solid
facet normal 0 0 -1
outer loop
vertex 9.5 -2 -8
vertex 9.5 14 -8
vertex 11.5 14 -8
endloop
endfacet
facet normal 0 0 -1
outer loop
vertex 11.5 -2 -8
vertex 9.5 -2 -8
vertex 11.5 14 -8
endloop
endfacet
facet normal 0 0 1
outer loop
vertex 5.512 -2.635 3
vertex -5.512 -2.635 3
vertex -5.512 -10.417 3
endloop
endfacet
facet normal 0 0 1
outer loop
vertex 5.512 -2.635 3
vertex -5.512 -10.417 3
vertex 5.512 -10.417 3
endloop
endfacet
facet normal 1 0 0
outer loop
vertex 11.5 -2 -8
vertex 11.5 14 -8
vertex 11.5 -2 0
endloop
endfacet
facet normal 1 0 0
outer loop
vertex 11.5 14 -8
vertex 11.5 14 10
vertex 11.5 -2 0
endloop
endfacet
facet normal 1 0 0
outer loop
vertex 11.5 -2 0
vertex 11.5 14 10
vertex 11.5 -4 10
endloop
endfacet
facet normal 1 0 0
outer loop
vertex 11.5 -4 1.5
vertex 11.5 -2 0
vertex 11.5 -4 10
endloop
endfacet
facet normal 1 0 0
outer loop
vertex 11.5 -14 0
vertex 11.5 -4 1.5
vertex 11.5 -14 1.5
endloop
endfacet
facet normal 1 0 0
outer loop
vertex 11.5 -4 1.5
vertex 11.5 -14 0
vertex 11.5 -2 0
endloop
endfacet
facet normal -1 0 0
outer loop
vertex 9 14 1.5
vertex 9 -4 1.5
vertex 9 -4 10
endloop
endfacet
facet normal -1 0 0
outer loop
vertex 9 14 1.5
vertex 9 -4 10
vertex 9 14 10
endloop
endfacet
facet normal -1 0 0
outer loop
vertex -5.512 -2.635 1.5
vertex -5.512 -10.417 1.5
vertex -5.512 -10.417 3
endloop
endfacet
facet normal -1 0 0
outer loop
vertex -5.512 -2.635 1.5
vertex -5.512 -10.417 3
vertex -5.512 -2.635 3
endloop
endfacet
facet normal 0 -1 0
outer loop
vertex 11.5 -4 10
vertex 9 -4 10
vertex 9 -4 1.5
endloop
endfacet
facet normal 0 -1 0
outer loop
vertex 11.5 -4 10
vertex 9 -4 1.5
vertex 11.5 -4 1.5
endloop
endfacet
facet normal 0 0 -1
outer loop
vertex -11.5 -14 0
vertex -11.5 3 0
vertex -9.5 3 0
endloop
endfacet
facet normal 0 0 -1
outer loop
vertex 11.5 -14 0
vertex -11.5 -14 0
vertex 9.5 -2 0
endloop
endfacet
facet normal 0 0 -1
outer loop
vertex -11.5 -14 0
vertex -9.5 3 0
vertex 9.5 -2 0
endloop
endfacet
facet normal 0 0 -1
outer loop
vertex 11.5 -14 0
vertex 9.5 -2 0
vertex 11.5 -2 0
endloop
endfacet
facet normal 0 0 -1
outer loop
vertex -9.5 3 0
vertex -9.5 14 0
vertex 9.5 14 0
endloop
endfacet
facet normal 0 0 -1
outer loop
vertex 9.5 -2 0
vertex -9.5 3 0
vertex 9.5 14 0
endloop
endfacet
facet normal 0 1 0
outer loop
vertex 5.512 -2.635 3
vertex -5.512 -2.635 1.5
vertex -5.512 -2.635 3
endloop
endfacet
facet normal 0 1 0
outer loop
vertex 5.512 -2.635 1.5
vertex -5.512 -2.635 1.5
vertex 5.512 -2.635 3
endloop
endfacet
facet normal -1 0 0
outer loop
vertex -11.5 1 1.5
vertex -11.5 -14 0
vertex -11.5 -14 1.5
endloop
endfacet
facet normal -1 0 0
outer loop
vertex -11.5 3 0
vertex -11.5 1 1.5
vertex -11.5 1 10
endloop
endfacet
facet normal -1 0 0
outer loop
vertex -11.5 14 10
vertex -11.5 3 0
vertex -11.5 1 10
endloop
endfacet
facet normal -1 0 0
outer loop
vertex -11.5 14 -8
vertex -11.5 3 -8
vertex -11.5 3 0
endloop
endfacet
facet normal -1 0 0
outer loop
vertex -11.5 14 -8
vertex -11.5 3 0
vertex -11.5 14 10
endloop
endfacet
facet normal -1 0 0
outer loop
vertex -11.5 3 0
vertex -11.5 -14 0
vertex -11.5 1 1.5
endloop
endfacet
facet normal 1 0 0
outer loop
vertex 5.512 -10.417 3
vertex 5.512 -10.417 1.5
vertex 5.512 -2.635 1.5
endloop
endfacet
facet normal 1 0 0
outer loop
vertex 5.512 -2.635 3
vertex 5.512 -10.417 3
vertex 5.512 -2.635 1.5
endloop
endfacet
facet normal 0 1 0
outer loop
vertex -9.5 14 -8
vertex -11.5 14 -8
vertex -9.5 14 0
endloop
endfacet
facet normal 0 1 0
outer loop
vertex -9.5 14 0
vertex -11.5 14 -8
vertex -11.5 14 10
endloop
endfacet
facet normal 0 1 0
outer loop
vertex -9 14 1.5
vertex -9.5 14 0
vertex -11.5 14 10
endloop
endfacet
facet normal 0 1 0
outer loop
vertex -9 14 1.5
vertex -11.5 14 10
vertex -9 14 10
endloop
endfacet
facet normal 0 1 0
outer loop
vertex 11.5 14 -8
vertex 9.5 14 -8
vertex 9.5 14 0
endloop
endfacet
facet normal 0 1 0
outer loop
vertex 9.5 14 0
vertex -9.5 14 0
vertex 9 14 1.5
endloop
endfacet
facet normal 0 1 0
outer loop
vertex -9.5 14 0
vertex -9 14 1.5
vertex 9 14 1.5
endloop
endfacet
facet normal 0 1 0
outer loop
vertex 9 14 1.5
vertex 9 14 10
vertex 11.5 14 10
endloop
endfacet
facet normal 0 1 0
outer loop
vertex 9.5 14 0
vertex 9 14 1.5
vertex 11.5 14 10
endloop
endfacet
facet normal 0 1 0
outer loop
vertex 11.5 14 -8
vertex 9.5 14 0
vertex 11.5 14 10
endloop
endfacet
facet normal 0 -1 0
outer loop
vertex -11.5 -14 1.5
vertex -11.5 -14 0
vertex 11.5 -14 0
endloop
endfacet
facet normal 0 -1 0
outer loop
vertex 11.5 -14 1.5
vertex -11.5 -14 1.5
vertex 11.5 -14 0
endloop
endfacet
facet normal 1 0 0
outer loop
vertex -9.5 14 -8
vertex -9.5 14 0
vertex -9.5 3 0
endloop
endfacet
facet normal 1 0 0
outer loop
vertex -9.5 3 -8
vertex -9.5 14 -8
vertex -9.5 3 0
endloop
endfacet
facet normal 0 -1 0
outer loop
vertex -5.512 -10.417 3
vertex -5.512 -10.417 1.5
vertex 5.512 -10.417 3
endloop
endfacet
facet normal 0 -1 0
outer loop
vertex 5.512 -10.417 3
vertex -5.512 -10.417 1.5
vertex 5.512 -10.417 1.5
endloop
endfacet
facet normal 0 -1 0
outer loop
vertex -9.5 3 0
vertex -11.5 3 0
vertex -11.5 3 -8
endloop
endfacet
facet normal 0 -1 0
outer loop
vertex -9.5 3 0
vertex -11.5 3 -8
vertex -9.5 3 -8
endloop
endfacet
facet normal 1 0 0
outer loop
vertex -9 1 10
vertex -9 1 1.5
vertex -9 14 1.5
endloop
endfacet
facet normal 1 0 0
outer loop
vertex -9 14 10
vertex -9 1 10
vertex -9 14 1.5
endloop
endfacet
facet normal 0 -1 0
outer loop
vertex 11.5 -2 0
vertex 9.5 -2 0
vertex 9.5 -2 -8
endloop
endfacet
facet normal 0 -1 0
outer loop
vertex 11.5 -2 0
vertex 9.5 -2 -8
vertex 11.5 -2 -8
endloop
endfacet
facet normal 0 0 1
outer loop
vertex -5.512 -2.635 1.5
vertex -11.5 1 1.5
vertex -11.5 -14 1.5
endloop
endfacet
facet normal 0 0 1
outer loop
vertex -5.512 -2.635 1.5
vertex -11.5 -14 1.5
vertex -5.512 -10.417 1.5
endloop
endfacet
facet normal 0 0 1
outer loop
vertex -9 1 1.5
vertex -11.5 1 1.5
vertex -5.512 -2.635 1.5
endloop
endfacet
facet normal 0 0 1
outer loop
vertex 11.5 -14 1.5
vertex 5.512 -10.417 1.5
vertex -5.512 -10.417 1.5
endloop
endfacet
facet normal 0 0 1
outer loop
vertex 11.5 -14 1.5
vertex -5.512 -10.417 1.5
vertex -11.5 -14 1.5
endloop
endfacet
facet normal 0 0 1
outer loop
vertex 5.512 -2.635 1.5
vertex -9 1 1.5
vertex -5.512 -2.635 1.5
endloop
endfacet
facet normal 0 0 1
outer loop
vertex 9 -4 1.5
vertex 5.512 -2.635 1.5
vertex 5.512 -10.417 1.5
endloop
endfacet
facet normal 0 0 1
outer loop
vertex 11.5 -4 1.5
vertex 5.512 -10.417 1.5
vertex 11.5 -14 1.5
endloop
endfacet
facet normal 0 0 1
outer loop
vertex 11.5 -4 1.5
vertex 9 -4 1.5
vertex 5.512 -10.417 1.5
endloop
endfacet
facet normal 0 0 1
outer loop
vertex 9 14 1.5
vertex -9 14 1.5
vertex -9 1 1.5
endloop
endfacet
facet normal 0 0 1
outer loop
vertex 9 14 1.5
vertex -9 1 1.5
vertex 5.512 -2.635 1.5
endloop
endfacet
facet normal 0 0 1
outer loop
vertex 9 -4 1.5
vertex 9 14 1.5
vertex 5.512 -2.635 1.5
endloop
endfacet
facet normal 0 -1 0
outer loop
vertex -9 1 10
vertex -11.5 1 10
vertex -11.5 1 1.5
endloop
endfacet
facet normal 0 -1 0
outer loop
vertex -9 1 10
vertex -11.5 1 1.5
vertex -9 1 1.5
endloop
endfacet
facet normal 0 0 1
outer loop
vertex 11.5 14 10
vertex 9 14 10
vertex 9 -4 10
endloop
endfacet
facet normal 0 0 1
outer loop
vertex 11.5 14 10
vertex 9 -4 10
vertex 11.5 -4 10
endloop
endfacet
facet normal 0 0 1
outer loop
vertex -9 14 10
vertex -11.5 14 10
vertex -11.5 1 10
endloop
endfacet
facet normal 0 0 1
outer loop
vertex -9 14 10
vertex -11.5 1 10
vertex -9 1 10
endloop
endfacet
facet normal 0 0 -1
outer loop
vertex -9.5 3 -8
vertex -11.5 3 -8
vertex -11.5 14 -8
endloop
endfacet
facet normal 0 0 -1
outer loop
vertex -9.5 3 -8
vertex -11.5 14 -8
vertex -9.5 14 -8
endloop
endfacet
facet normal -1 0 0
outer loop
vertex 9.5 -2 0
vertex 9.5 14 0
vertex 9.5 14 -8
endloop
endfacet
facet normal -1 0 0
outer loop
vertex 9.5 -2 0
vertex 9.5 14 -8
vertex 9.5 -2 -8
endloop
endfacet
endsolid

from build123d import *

# Parameters (mm, degrees)
F0_W     = 23
F0_H     = 28
F1_DEPTH = 1.5
F2_W     = 2.5
F2_H     = 13
F2_H_2   = 18
F3_DEPTH = 8.5
F4_W     = 2
F4_H     = 16
F4_H_2   = 11
F5_DEPTH = 8
F6_W     = 11.023622
F6_H     = 7.782471
F7_DEPTH = 1.5


with BuildPart() as f1:
    # F0 (on Top) → F1 (new body)
    with BuildSketch(Plane.XY):
        Rectangle(F0_W, F0_H)
    extrude(amount=F1_DEPTH)

    # F2 (on face) → F3 (join)
    with BuildSketch(Plane.XY.offset(1.5)):
        with Locations((-10.25, 7.5)):
            Rectangle(F2_W, F2_H)
        with Locations((10.25, 5)):
            Rectangle(F2_W, F2_H_2)
    extrude(amount=F3_DEPTH)

    # F4 (on face) → F5 (join)
    with BuildSketch(Plane(origin=(0, 0, 0), x_dir=(1, 0, 0), z_dir=(0, 0, -1))):
        with Locations((10.5, -6)):
            Rectangle(F4_W, F4_H)
        with Locations((-10.5, -8.5)):
            Rectangle(F4_W, F4_H_2)
    extrude(amount=F5_DEPTH)

    # F6 (on face) → F7 (join)
    with BuildSketch(Plane.XY.offset(1.5)):
        with Locations((0, -6.526084)):
            Rectangle(F6_W, F6_H)
    extrude(amount=F7_DEPTH)


solid = f1.part
